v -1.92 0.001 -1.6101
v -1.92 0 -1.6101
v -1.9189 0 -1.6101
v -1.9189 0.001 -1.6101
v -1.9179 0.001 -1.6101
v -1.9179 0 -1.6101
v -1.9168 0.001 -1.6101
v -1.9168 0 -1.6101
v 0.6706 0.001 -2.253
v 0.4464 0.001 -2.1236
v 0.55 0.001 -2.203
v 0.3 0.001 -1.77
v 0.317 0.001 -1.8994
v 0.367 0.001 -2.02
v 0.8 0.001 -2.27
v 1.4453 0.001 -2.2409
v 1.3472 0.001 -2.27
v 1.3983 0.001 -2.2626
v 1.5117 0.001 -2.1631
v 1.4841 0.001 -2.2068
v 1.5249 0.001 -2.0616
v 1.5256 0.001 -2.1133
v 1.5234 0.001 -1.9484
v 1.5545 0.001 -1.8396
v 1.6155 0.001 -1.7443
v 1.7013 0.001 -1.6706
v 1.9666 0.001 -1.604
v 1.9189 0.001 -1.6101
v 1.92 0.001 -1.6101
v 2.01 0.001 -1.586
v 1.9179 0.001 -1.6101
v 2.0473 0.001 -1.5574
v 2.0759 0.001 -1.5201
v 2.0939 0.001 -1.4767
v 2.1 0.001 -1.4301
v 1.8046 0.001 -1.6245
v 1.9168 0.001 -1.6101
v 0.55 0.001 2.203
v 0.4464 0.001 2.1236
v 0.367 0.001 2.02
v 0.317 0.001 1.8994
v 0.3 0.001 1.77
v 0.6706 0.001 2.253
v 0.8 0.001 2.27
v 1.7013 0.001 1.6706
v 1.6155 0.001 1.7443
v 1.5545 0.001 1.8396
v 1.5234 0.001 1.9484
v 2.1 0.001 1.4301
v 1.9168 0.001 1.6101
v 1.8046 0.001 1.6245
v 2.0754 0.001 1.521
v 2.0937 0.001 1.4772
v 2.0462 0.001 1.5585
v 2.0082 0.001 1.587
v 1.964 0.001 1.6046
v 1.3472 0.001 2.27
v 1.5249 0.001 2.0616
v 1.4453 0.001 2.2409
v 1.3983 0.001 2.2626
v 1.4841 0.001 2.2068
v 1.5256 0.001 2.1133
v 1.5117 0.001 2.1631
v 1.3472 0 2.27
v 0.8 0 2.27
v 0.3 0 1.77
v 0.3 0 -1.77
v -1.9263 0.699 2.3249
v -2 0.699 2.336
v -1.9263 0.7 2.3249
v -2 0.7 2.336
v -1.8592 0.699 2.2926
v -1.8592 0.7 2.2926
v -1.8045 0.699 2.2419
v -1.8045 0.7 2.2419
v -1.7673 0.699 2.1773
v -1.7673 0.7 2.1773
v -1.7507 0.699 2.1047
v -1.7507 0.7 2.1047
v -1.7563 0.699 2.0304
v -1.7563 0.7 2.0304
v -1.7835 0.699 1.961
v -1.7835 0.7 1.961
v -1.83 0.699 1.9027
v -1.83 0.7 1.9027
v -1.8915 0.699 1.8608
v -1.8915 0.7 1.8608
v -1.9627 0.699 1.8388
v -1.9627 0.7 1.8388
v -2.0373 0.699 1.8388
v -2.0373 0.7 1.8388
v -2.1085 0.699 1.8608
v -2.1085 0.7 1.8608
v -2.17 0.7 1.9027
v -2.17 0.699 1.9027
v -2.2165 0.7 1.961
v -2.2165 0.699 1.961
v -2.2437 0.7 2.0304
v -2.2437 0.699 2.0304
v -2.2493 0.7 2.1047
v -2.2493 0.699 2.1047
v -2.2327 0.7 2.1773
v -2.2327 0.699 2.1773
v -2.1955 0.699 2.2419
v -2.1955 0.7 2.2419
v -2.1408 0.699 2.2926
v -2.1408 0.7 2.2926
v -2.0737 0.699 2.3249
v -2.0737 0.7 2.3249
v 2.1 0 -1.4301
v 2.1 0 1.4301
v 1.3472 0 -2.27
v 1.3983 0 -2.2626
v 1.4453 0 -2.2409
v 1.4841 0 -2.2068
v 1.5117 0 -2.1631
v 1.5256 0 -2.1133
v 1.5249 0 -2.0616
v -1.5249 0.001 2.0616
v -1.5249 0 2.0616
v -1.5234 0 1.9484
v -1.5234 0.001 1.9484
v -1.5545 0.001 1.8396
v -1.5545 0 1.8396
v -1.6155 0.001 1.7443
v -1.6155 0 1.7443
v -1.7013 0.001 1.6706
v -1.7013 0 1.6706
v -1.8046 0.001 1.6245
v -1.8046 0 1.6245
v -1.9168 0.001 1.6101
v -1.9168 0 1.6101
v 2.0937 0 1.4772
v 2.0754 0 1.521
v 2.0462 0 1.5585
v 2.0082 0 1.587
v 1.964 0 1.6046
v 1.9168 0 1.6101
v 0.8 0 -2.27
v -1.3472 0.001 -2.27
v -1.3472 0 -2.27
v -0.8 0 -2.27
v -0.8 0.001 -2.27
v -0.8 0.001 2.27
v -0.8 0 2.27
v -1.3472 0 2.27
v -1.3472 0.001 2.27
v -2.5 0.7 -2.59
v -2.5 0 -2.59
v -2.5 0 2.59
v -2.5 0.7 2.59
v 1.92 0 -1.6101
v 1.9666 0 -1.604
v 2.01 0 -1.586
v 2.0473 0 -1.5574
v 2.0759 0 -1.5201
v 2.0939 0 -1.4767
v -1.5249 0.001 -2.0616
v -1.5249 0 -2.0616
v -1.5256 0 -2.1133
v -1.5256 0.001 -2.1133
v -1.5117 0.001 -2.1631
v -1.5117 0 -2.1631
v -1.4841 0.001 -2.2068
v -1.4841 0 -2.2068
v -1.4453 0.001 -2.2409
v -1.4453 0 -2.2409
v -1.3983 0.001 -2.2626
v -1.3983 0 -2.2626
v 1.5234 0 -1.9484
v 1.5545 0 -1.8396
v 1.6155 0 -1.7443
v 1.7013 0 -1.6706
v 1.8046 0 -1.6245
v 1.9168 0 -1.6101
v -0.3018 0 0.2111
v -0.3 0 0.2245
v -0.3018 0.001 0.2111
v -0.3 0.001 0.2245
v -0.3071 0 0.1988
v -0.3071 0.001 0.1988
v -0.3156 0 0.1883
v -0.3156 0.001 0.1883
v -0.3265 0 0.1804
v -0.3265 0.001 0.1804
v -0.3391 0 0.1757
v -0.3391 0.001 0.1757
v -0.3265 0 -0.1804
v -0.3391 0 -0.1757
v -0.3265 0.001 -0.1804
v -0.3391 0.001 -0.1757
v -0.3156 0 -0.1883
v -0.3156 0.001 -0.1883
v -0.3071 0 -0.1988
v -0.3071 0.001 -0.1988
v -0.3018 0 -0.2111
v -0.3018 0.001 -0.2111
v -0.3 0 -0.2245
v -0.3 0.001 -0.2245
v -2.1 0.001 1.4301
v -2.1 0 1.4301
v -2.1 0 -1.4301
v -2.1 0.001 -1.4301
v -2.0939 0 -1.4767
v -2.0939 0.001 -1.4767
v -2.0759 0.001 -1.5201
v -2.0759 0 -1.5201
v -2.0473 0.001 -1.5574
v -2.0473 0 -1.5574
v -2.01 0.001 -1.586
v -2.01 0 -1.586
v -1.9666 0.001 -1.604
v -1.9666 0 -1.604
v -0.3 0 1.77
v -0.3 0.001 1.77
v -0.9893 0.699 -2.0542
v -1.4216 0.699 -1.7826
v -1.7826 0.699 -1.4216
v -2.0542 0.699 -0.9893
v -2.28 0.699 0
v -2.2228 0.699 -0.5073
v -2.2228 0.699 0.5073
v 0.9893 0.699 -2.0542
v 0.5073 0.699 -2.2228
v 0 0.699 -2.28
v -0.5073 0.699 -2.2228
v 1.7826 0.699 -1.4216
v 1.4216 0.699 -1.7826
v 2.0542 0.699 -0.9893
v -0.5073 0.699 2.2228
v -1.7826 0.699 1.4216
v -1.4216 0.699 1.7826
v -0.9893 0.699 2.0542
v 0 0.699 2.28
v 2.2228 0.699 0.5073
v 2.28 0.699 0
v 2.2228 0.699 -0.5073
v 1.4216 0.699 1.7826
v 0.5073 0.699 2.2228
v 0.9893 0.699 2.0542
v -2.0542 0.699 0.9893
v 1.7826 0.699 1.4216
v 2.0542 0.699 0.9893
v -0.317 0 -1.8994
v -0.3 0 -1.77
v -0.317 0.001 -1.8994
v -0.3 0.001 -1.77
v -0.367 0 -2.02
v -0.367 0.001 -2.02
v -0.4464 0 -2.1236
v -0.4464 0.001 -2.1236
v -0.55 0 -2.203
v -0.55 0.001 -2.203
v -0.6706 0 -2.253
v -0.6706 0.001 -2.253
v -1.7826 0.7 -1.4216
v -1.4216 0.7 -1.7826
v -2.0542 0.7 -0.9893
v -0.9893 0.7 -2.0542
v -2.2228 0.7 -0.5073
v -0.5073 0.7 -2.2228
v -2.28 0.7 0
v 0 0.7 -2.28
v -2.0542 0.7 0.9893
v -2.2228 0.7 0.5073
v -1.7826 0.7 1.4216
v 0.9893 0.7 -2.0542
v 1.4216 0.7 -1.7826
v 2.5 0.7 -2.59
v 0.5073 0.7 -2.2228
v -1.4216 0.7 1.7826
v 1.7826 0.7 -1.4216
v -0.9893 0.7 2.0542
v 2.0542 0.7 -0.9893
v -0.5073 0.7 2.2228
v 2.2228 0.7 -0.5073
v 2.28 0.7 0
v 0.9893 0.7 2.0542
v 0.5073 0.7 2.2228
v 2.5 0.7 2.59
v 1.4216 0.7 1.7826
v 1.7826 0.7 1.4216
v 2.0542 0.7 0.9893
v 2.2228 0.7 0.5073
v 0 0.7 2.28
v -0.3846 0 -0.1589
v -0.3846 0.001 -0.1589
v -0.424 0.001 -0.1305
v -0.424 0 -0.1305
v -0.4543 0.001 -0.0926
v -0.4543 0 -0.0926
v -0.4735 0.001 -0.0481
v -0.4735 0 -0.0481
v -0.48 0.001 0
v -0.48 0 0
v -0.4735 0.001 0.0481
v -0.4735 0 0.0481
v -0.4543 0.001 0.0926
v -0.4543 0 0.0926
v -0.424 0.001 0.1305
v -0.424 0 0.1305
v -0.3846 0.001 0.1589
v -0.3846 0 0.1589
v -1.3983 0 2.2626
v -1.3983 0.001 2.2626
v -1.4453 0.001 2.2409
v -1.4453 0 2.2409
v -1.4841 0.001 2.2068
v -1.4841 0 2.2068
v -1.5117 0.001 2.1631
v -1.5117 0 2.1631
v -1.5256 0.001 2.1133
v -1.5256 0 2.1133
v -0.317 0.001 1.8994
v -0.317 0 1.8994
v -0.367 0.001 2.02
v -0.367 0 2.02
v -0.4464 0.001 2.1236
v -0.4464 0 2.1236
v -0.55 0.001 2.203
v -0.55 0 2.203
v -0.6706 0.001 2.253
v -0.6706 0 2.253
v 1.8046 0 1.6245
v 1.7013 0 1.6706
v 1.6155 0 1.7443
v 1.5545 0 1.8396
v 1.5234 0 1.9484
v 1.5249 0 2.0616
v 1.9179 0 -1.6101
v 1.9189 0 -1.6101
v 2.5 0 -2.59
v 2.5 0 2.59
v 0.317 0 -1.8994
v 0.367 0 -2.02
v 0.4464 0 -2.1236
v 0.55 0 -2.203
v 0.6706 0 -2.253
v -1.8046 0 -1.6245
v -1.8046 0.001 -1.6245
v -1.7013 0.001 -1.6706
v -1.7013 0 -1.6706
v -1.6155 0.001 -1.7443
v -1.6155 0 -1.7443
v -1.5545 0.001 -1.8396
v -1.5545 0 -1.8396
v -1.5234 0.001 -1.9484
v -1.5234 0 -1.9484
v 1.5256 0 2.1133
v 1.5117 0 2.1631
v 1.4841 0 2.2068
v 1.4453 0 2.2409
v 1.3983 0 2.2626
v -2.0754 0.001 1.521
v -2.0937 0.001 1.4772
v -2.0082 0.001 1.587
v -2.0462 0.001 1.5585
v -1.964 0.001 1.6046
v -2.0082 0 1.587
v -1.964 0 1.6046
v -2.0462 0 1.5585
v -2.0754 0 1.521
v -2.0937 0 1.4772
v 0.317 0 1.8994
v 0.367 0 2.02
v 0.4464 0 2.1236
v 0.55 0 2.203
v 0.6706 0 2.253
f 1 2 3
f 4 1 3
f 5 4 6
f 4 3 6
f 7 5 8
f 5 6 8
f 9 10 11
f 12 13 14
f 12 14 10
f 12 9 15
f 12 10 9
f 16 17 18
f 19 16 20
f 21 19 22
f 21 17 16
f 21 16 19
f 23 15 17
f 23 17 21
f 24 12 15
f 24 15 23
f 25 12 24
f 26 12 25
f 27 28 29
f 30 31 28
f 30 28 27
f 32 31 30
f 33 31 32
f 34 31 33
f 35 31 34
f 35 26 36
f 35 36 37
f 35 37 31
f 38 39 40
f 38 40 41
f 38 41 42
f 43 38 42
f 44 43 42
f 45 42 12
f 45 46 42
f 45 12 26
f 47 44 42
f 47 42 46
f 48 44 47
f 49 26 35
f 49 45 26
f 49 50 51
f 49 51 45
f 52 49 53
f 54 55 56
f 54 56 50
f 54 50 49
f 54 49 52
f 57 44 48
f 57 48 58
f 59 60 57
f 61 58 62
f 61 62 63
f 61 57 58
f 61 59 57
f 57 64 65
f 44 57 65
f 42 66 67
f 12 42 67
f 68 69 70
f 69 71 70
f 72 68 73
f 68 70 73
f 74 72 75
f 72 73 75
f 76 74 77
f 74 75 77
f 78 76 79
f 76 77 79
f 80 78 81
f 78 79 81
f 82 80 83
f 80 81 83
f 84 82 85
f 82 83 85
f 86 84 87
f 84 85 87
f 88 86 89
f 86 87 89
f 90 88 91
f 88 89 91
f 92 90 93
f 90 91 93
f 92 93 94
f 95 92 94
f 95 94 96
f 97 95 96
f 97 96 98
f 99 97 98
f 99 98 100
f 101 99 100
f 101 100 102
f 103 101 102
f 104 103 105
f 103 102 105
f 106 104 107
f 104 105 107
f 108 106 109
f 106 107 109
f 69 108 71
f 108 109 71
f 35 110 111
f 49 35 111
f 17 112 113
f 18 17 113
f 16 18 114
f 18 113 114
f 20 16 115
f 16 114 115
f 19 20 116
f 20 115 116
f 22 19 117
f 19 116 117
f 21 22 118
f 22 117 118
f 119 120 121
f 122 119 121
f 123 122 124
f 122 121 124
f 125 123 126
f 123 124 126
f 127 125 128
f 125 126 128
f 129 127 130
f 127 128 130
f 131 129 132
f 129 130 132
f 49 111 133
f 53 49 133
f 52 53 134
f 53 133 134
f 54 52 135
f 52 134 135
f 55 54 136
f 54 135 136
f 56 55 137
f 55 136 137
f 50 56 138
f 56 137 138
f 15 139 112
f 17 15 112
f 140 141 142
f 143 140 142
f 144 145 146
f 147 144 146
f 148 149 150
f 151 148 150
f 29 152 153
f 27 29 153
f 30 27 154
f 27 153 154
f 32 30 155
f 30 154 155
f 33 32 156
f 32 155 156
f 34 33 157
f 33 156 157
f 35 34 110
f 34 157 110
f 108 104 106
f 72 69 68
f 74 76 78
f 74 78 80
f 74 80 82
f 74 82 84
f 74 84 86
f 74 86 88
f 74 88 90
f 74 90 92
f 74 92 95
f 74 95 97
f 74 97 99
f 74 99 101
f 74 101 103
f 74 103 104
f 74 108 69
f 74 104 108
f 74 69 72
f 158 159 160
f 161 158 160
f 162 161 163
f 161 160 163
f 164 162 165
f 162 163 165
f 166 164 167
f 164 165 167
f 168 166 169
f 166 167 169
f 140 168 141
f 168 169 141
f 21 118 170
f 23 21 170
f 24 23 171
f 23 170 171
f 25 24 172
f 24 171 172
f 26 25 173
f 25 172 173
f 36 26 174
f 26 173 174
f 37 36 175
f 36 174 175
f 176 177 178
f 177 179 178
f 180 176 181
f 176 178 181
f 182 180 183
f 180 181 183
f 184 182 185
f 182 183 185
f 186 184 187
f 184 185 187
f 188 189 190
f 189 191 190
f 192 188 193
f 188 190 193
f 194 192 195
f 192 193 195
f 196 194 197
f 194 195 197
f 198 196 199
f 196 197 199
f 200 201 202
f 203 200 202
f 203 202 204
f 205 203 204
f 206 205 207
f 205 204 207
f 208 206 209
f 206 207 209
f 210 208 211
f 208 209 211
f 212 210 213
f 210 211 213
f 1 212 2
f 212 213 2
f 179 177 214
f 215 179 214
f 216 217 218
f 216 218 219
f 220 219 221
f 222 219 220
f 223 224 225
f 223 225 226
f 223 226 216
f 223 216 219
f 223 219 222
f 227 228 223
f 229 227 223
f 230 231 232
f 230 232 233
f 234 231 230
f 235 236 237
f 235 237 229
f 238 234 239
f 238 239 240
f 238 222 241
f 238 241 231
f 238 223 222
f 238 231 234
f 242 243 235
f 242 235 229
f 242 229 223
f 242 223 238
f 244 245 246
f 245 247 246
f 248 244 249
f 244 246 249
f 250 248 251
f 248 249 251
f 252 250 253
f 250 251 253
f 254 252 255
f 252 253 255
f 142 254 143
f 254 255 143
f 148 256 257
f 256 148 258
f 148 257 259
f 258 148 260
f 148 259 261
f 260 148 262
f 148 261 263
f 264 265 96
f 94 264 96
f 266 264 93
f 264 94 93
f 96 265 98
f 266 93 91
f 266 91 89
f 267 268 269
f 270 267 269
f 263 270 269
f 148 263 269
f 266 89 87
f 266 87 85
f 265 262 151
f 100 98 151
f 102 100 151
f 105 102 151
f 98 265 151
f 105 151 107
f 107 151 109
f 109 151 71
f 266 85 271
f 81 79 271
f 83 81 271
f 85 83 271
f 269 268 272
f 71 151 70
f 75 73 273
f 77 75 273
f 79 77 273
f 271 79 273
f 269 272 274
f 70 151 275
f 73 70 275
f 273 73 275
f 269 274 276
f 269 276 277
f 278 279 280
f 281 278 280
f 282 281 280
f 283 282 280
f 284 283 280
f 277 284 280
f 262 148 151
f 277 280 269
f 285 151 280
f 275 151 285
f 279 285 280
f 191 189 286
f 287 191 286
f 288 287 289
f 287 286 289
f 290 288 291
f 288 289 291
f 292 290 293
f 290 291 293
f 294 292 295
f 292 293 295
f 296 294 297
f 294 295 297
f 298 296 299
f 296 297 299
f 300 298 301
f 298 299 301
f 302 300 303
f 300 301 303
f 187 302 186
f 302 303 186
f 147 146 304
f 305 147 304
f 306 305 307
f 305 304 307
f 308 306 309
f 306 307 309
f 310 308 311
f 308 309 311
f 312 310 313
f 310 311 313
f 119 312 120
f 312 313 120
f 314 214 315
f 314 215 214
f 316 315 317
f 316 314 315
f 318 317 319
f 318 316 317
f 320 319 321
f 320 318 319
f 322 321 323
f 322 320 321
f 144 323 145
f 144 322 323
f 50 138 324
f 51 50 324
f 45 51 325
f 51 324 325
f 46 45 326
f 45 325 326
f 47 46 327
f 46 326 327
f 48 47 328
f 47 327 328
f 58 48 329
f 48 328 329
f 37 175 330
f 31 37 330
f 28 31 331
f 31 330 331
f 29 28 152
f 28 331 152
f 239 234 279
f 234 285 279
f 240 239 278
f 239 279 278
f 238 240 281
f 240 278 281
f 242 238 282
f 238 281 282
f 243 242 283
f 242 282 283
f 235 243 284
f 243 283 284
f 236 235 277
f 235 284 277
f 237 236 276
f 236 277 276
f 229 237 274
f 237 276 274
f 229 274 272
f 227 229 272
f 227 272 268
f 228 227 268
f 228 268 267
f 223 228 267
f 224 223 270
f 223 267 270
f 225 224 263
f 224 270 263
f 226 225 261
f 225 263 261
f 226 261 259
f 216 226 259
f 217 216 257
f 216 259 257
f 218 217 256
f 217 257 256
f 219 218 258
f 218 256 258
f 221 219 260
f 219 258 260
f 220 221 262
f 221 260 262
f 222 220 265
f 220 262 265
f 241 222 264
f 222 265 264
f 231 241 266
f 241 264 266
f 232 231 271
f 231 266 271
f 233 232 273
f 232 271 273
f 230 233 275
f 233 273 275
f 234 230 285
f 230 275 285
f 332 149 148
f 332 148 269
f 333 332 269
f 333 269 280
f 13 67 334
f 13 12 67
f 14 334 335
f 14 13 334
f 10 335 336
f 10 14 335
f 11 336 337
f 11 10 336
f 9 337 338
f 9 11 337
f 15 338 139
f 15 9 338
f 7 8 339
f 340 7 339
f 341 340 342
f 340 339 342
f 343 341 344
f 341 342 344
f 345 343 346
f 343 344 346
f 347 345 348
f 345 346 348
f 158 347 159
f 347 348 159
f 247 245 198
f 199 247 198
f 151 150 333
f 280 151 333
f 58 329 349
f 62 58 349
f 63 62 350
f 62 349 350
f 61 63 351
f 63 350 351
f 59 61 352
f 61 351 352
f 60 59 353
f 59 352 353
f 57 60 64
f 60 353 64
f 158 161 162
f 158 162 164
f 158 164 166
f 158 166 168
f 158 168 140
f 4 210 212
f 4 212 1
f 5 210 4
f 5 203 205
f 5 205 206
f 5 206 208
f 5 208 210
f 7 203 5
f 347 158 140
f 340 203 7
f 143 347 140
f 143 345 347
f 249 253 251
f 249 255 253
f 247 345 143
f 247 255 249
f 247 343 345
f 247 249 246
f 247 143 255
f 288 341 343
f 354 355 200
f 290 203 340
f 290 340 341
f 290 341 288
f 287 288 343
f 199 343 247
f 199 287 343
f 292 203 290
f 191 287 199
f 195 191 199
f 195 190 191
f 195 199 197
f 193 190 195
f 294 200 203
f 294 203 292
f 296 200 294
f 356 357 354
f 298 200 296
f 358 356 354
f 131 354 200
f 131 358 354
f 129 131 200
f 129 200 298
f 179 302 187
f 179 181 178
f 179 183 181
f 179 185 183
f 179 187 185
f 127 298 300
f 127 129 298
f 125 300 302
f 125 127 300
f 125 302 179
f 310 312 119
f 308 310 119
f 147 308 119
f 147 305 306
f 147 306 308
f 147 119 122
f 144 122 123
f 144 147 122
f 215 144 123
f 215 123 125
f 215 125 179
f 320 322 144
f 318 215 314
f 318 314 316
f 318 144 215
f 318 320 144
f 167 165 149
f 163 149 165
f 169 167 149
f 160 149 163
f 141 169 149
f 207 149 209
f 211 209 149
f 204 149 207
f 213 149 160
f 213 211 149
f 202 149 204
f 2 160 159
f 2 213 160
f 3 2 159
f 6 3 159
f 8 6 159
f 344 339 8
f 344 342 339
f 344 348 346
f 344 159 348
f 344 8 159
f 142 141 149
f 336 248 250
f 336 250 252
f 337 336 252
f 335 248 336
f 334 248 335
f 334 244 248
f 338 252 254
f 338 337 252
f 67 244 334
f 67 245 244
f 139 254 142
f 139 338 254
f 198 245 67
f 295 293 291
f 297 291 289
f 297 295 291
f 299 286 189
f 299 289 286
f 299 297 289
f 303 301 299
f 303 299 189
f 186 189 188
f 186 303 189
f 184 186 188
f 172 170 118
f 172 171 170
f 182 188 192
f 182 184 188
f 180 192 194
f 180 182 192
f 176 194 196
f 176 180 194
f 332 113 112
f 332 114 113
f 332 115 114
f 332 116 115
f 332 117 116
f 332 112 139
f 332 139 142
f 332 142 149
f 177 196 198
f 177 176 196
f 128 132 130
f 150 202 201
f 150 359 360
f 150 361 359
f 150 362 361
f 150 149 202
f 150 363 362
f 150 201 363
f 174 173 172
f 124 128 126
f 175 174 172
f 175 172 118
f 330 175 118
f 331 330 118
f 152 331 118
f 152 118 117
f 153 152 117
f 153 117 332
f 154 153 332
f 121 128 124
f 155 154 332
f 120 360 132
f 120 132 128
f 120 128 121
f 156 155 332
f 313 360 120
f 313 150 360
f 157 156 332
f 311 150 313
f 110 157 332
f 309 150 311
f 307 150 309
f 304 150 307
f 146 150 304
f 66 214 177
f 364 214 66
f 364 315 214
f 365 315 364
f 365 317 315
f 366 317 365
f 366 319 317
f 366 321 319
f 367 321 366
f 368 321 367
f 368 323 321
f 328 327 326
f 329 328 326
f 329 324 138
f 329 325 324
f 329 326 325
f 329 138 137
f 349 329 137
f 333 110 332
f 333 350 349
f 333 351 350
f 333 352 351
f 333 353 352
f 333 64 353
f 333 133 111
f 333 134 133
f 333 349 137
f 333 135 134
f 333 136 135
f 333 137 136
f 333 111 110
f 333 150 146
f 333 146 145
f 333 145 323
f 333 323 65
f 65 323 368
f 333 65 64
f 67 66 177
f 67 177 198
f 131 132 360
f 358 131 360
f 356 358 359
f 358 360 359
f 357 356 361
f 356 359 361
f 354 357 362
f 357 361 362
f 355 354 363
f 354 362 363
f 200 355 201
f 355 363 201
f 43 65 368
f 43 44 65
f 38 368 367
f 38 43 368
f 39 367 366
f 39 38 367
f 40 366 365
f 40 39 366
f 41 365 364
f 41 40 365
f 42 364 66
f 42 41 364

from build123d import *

# Parameters (mm, degrees)
SKETCH1_W      = 5
SKETCH1_H      = 5.18
EXTRUDE1_DEPTH = 0.7
EXTRUDE2_DEPTH = 0.001
EXTRUDE3_DEPTH = 0.001
SKETCH4_W      = 2.28
SKETCH4_H      = 0.001
SKETCH5_W      = 0.25
SKETCH5_H      = 0.001
FILLET1_R      = 0.05
FILLET2_R      = 0.5


with BuildPart() as part:
    # Sketch1 → Extrude1 (new body)
    with BuildSketch(Plane.XZ):
        Rectangle(SKETCH1_W, SKETCH1_H)
    extrude(amount=-EXTRUDE1_DEPTH)

    # Sketch2 → Extrude2 (cut)
    with BuildSketch(Plane.XZ):
        with BuildLine():
            Line((-0.3, 0.18), (-0.3, 2.27))
            Line((-0.3, 2.27), (-1.347150109, 2.27))
            ThreePointArc((-1.347150109, 2.27), (-1.484109573, 2.206799423), (-1.52489218, 2.061578947))
            ThreePointArc((-1.52489218, 2.061578947), (-1.61548587, 1.744341189), (-1.916842105, 1.610060023))
            ThreePointArc((-1.916842105, 1.610060023), (-2.046157796, 1.558478577), (-2.1, 1.430087726))
            Line((-2.1, 1.430087726), (-2.1, -1.430087726))
            ThreePointArc((-2.1, -1.430087726), (-2.047279221, -1.557366947), (-1.92, -1.610087726))
            ThreePointArc((-1.92, -1.610087726), (-1.918420992, -1.6100808), (-1.916842105, -1.610060023))
            ThreePointArc((-1.916842105, -1.610060023), (-1.61548587, -1.744341189), (-1.52489218, -2.061578947))
            ThreePointArc((-1.52489218, -2.061578947), (-1.484109573, -2.206799423), (-1.347150109, -2.27))
            Line((-1.347150109, -2.27), (-0.3, -2.27))
            Line((-0.3, -2.27), (-0.3, -0.18))
            ThreePointArc((-0.3, -0.18), (-0.48, 0), (-0.3, 0.18))
        make_face()
    extrude(amount=-EXTRUDE2_DEPTH, mode=Mode.SUBTRACT)

    # Sketch3 → Extrude3 (cut)
    with BuildSketch(Plane.XZ):
        with BuildLine():
            Line((1.347150109, 2.27), (0.3, 2.27))
            Line((0.3, 2.27), (0.3, -2.27))
            Line((0.3, -2.27), (1.347150109, -2.27))
            ThreePointArc((1.347150109, -2.27), (1.484109573, -2.206799423), (1.52489218, -2.061578947))
            ThreePointArc((1.52489218, -2.061578947), (1.61548587, -1.744341189), (1.916842105, -1.610060023))
            ThreePointArc((1.916842105, -1.610060023), (1.918420992, -1.6100808), (1.92, -1.610087726))
            ThreePointArc((1.92, -1.610087726), (2.047279221, -1.557366947), (2.1, -1.430087726))
            Line((2.1, -1.430087726), (2.1, 1.430087726))
            ThreePointArc((2.1, 1.430087726), (2.046157796, 1.558478577), (1.916842105, 1.610060023))
            ThreePointArc((1.916842105, 1.610060023), (1.61548587, 1.744341189), (1.52489218, 2.061578947))
            ThreePointArc((1.52489218, 2.061578947), (1.484109573, 2.206799423), (1.347150109, 2.27))
        make_face()
    extrude(amount=-EXTRUDE3_DEPTH, mode=Mode.SUBTRACT)

    # Sketch4 → Cut-Revolve1 (revolve, cut)
    with BuildSketch(Plane(origin=(0, 0, 0), x_dir=(-1, 0, 0), z_dir=(0, 0, -1)), mode=Mode.PRIVATE) as cut_revolve1_sk:
        with Locations((-1.14, 0.6995)):
            Rectangle(SKETCH4_W, SKETCH4_H)
    revolve(cut_revolve1_sk.sketch.rotate(Axis((0, 0.699, 0), (0, 1, 0)), 270), axis=Axis((0, 0.699, 0), (0, 1, 0)), mode=Mode.SUBTRACT)

    # Sketch5 → Cut-Revolve2 (revolve, cut)
    with BuildSketch(Plane(origin=(0, 0, 2.086), x_dir=(-1, 0, 0), z_dir=(0, 0, -1)), mode=Mode.PRIVATE) as cut_revolve2_sk:
        with Locations((1.875, 0.6995)):
            Rectangle(SKETCH5_W, SKETCH5_H)
    revolve(cut_revolve2_sk.sketch.rotate(Axis((-2, 0.699, 2.086), (0, 1, 0)), 270), axis=Axis((-2, 0.699, 2.086), (0, 1, 0)), mode=Mode.SUBTRACT)

    # Fillet1
    fillet1_edges = [part.edges().sort_by_distance(p)[0] for p in [
        (-0.3, 0.0005, 0.18),
        (-0.3, 0.0005, -0.18),
    ]]
    fillet(fillet1_edges, radius=FILLET1_R)

    # Fillet2
    fillet2_edges = [part.edges().sort_by_distance(p)[0] for p in [
        (-0.3, 0.0005, -2.27),
        (-0.3, 0.0005, 2.27),
        (0.3, 0.0005, -2.27),
        (0.3, 0.0005, 2.27),
    ]]
    fillet(fillet2_edges, radius=FILLET2_R)


solid = part.part
